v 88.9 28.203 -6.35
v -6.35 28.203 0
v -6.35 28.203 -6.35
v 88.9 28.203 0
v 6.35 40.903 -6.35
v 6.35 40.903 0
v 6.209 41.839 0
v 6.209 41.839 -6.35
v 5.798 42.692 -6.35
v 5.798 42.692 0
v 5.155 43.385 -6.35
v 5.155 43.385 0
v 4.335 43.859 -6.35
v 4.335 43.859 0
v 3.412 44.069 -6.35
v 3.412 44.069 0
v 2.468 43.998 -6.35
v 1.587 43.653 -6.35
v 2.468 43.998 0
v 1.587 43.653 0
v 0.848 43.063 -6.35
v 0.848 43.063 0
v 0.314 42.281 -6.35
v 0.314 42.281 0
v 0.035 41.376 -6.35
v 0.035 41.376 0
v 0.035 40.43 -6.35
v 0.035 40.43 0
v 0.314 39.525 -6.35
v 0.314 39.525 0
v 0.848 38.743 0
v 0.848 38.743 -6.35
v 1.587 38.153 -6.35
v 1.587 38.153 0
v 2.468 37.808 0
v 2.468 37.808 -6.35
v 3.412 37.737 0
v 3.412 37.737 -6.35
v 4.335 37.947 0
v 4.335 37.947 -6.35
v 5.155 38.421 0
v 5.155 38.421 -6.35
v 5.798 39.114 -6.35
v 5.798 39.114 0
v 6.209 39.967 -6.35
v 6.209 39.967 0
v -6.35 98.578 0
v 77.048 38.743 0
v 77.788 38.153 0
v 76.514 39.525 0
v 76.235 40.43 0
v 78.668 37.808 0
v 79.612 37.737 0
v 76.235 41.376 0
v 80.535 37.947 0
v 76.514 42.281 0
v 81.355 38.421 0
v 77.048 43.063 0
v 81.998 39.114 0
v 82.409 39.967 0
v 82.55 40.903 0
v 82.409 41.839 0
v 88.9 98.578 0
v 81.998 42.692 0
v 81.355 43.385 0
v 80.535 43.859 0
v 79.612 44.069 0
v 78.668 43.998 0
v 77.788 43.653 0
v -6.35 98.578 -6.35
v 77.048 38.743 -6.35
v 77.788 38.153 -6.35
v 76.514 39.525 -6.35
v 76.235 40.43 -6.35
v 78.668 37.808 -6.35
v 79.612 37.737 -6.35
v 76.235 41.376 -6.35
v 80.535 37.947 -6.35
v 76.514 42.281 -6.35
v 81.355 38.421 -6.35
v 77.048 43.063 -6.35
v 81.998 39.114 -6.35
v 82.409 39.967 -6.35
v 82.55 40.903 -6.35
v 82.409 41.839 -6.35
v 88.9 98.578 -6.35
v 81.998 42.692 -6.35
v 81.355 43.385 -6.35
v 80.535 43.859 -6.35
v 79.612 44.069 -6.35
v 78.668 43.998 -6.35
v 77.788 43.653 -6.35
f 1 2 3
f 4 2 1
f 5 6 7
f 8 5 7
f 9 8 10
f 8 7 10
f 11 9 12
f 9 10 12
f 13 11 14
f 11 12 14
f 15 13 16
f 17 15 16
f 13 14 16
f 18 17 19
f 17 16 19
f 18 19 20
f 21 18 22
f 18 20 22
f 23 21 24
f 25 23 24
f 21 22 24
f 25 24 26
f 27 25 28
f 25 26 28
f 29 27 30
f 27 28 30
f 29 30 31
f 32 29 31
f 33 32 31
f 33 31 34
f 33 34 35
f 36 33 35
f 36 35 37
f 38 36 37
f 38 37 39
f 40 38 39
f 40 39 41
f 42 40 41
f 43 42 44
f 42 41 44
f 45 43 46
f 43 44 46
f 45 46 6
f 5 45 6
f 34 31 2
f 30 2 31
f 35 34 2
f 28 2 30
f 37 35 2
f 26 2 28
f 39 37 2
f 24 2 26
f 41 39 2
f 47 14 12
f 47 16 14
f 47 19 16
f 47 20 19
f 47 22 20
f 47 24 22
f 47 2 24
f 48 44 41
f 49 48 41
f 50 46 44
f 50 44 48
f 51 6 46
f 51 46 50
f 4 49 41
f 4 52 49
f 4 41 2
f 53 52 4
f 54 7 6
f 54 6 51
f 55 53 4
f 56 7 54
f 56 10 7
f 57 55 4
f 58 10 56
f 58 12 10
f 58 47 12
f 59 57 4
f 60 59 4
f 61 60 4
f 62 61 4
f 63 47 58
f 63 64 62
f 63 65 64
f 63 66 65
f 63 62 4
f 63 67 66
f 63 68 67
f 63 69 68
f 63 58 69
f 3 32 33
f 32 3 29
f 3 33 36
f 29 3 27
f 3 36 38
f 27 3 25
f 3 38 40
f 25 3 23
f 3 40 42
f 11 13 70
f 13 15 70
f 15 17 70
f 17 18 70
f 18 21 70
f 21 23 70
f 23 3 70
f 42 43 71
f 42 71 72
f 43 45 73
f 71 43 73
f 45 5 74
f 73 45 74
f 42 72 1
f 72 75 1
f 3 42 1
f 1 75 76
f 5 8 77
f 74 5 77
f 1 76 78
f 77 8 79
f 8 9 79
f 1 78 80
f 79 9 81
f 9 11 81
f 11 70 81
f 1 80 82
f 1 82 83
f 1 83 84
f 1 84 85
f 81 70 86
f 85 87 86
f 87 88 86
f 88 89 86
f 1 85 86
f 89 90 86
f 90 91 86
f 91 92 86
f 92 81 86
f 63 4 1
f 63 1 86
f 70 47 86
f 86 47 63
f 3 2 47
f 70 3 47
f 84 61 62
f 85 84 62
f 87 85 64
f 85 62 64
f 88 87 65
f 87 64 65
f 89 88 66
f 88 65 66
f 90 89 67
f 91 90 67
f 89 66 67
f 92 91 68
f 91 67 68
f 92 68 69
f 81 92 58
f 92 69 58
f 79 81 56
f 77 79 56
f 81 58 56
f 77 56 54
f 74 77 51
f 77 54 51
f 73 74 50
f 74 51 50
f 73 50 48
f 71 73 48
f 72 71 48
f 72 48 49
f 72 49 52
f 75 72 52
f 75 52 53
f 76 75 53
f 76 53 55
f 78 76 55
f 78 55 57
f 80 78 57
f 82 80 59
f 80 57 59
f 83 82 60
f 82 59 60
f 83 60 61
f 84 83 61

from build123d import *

# Parameters (mm, degrees)
SKETCH1_W           = 95.25
SKETCH1_H           = 70.374561309
BOSS_EXTRUDE1_DEPTH = 6.35
SKETCH2_R           = 3.175
CUT_EXTRUDE1_DEPTH  = 6.35


with BuildPart() as part:
    # Sketch1 → Boss-Extrude1 (new body)
    with BuildSketch(Plane.XY):
        with Locations((41.275, 63.390258975)):
            Rectangle(SKETCH1_W, SKETCH1_H)
    extrude(amount=-BOSS_EXTRUDE1_DEPTH)

    # Sketch2 → Cut-Extrude1 (cut)
    with BuildSketch(Plane.XY):
        with Locations((79.375, 40.90297832)):
            Circle(SKETCH2_R)
        with Locations((3.175, 40.90297832)):
            Circle(SKETCH2_R)
    extrude(amount=-CUT_EXTRUDE1_DEPTH, mode=Mode.SUBTRACT)


solid = part.part
